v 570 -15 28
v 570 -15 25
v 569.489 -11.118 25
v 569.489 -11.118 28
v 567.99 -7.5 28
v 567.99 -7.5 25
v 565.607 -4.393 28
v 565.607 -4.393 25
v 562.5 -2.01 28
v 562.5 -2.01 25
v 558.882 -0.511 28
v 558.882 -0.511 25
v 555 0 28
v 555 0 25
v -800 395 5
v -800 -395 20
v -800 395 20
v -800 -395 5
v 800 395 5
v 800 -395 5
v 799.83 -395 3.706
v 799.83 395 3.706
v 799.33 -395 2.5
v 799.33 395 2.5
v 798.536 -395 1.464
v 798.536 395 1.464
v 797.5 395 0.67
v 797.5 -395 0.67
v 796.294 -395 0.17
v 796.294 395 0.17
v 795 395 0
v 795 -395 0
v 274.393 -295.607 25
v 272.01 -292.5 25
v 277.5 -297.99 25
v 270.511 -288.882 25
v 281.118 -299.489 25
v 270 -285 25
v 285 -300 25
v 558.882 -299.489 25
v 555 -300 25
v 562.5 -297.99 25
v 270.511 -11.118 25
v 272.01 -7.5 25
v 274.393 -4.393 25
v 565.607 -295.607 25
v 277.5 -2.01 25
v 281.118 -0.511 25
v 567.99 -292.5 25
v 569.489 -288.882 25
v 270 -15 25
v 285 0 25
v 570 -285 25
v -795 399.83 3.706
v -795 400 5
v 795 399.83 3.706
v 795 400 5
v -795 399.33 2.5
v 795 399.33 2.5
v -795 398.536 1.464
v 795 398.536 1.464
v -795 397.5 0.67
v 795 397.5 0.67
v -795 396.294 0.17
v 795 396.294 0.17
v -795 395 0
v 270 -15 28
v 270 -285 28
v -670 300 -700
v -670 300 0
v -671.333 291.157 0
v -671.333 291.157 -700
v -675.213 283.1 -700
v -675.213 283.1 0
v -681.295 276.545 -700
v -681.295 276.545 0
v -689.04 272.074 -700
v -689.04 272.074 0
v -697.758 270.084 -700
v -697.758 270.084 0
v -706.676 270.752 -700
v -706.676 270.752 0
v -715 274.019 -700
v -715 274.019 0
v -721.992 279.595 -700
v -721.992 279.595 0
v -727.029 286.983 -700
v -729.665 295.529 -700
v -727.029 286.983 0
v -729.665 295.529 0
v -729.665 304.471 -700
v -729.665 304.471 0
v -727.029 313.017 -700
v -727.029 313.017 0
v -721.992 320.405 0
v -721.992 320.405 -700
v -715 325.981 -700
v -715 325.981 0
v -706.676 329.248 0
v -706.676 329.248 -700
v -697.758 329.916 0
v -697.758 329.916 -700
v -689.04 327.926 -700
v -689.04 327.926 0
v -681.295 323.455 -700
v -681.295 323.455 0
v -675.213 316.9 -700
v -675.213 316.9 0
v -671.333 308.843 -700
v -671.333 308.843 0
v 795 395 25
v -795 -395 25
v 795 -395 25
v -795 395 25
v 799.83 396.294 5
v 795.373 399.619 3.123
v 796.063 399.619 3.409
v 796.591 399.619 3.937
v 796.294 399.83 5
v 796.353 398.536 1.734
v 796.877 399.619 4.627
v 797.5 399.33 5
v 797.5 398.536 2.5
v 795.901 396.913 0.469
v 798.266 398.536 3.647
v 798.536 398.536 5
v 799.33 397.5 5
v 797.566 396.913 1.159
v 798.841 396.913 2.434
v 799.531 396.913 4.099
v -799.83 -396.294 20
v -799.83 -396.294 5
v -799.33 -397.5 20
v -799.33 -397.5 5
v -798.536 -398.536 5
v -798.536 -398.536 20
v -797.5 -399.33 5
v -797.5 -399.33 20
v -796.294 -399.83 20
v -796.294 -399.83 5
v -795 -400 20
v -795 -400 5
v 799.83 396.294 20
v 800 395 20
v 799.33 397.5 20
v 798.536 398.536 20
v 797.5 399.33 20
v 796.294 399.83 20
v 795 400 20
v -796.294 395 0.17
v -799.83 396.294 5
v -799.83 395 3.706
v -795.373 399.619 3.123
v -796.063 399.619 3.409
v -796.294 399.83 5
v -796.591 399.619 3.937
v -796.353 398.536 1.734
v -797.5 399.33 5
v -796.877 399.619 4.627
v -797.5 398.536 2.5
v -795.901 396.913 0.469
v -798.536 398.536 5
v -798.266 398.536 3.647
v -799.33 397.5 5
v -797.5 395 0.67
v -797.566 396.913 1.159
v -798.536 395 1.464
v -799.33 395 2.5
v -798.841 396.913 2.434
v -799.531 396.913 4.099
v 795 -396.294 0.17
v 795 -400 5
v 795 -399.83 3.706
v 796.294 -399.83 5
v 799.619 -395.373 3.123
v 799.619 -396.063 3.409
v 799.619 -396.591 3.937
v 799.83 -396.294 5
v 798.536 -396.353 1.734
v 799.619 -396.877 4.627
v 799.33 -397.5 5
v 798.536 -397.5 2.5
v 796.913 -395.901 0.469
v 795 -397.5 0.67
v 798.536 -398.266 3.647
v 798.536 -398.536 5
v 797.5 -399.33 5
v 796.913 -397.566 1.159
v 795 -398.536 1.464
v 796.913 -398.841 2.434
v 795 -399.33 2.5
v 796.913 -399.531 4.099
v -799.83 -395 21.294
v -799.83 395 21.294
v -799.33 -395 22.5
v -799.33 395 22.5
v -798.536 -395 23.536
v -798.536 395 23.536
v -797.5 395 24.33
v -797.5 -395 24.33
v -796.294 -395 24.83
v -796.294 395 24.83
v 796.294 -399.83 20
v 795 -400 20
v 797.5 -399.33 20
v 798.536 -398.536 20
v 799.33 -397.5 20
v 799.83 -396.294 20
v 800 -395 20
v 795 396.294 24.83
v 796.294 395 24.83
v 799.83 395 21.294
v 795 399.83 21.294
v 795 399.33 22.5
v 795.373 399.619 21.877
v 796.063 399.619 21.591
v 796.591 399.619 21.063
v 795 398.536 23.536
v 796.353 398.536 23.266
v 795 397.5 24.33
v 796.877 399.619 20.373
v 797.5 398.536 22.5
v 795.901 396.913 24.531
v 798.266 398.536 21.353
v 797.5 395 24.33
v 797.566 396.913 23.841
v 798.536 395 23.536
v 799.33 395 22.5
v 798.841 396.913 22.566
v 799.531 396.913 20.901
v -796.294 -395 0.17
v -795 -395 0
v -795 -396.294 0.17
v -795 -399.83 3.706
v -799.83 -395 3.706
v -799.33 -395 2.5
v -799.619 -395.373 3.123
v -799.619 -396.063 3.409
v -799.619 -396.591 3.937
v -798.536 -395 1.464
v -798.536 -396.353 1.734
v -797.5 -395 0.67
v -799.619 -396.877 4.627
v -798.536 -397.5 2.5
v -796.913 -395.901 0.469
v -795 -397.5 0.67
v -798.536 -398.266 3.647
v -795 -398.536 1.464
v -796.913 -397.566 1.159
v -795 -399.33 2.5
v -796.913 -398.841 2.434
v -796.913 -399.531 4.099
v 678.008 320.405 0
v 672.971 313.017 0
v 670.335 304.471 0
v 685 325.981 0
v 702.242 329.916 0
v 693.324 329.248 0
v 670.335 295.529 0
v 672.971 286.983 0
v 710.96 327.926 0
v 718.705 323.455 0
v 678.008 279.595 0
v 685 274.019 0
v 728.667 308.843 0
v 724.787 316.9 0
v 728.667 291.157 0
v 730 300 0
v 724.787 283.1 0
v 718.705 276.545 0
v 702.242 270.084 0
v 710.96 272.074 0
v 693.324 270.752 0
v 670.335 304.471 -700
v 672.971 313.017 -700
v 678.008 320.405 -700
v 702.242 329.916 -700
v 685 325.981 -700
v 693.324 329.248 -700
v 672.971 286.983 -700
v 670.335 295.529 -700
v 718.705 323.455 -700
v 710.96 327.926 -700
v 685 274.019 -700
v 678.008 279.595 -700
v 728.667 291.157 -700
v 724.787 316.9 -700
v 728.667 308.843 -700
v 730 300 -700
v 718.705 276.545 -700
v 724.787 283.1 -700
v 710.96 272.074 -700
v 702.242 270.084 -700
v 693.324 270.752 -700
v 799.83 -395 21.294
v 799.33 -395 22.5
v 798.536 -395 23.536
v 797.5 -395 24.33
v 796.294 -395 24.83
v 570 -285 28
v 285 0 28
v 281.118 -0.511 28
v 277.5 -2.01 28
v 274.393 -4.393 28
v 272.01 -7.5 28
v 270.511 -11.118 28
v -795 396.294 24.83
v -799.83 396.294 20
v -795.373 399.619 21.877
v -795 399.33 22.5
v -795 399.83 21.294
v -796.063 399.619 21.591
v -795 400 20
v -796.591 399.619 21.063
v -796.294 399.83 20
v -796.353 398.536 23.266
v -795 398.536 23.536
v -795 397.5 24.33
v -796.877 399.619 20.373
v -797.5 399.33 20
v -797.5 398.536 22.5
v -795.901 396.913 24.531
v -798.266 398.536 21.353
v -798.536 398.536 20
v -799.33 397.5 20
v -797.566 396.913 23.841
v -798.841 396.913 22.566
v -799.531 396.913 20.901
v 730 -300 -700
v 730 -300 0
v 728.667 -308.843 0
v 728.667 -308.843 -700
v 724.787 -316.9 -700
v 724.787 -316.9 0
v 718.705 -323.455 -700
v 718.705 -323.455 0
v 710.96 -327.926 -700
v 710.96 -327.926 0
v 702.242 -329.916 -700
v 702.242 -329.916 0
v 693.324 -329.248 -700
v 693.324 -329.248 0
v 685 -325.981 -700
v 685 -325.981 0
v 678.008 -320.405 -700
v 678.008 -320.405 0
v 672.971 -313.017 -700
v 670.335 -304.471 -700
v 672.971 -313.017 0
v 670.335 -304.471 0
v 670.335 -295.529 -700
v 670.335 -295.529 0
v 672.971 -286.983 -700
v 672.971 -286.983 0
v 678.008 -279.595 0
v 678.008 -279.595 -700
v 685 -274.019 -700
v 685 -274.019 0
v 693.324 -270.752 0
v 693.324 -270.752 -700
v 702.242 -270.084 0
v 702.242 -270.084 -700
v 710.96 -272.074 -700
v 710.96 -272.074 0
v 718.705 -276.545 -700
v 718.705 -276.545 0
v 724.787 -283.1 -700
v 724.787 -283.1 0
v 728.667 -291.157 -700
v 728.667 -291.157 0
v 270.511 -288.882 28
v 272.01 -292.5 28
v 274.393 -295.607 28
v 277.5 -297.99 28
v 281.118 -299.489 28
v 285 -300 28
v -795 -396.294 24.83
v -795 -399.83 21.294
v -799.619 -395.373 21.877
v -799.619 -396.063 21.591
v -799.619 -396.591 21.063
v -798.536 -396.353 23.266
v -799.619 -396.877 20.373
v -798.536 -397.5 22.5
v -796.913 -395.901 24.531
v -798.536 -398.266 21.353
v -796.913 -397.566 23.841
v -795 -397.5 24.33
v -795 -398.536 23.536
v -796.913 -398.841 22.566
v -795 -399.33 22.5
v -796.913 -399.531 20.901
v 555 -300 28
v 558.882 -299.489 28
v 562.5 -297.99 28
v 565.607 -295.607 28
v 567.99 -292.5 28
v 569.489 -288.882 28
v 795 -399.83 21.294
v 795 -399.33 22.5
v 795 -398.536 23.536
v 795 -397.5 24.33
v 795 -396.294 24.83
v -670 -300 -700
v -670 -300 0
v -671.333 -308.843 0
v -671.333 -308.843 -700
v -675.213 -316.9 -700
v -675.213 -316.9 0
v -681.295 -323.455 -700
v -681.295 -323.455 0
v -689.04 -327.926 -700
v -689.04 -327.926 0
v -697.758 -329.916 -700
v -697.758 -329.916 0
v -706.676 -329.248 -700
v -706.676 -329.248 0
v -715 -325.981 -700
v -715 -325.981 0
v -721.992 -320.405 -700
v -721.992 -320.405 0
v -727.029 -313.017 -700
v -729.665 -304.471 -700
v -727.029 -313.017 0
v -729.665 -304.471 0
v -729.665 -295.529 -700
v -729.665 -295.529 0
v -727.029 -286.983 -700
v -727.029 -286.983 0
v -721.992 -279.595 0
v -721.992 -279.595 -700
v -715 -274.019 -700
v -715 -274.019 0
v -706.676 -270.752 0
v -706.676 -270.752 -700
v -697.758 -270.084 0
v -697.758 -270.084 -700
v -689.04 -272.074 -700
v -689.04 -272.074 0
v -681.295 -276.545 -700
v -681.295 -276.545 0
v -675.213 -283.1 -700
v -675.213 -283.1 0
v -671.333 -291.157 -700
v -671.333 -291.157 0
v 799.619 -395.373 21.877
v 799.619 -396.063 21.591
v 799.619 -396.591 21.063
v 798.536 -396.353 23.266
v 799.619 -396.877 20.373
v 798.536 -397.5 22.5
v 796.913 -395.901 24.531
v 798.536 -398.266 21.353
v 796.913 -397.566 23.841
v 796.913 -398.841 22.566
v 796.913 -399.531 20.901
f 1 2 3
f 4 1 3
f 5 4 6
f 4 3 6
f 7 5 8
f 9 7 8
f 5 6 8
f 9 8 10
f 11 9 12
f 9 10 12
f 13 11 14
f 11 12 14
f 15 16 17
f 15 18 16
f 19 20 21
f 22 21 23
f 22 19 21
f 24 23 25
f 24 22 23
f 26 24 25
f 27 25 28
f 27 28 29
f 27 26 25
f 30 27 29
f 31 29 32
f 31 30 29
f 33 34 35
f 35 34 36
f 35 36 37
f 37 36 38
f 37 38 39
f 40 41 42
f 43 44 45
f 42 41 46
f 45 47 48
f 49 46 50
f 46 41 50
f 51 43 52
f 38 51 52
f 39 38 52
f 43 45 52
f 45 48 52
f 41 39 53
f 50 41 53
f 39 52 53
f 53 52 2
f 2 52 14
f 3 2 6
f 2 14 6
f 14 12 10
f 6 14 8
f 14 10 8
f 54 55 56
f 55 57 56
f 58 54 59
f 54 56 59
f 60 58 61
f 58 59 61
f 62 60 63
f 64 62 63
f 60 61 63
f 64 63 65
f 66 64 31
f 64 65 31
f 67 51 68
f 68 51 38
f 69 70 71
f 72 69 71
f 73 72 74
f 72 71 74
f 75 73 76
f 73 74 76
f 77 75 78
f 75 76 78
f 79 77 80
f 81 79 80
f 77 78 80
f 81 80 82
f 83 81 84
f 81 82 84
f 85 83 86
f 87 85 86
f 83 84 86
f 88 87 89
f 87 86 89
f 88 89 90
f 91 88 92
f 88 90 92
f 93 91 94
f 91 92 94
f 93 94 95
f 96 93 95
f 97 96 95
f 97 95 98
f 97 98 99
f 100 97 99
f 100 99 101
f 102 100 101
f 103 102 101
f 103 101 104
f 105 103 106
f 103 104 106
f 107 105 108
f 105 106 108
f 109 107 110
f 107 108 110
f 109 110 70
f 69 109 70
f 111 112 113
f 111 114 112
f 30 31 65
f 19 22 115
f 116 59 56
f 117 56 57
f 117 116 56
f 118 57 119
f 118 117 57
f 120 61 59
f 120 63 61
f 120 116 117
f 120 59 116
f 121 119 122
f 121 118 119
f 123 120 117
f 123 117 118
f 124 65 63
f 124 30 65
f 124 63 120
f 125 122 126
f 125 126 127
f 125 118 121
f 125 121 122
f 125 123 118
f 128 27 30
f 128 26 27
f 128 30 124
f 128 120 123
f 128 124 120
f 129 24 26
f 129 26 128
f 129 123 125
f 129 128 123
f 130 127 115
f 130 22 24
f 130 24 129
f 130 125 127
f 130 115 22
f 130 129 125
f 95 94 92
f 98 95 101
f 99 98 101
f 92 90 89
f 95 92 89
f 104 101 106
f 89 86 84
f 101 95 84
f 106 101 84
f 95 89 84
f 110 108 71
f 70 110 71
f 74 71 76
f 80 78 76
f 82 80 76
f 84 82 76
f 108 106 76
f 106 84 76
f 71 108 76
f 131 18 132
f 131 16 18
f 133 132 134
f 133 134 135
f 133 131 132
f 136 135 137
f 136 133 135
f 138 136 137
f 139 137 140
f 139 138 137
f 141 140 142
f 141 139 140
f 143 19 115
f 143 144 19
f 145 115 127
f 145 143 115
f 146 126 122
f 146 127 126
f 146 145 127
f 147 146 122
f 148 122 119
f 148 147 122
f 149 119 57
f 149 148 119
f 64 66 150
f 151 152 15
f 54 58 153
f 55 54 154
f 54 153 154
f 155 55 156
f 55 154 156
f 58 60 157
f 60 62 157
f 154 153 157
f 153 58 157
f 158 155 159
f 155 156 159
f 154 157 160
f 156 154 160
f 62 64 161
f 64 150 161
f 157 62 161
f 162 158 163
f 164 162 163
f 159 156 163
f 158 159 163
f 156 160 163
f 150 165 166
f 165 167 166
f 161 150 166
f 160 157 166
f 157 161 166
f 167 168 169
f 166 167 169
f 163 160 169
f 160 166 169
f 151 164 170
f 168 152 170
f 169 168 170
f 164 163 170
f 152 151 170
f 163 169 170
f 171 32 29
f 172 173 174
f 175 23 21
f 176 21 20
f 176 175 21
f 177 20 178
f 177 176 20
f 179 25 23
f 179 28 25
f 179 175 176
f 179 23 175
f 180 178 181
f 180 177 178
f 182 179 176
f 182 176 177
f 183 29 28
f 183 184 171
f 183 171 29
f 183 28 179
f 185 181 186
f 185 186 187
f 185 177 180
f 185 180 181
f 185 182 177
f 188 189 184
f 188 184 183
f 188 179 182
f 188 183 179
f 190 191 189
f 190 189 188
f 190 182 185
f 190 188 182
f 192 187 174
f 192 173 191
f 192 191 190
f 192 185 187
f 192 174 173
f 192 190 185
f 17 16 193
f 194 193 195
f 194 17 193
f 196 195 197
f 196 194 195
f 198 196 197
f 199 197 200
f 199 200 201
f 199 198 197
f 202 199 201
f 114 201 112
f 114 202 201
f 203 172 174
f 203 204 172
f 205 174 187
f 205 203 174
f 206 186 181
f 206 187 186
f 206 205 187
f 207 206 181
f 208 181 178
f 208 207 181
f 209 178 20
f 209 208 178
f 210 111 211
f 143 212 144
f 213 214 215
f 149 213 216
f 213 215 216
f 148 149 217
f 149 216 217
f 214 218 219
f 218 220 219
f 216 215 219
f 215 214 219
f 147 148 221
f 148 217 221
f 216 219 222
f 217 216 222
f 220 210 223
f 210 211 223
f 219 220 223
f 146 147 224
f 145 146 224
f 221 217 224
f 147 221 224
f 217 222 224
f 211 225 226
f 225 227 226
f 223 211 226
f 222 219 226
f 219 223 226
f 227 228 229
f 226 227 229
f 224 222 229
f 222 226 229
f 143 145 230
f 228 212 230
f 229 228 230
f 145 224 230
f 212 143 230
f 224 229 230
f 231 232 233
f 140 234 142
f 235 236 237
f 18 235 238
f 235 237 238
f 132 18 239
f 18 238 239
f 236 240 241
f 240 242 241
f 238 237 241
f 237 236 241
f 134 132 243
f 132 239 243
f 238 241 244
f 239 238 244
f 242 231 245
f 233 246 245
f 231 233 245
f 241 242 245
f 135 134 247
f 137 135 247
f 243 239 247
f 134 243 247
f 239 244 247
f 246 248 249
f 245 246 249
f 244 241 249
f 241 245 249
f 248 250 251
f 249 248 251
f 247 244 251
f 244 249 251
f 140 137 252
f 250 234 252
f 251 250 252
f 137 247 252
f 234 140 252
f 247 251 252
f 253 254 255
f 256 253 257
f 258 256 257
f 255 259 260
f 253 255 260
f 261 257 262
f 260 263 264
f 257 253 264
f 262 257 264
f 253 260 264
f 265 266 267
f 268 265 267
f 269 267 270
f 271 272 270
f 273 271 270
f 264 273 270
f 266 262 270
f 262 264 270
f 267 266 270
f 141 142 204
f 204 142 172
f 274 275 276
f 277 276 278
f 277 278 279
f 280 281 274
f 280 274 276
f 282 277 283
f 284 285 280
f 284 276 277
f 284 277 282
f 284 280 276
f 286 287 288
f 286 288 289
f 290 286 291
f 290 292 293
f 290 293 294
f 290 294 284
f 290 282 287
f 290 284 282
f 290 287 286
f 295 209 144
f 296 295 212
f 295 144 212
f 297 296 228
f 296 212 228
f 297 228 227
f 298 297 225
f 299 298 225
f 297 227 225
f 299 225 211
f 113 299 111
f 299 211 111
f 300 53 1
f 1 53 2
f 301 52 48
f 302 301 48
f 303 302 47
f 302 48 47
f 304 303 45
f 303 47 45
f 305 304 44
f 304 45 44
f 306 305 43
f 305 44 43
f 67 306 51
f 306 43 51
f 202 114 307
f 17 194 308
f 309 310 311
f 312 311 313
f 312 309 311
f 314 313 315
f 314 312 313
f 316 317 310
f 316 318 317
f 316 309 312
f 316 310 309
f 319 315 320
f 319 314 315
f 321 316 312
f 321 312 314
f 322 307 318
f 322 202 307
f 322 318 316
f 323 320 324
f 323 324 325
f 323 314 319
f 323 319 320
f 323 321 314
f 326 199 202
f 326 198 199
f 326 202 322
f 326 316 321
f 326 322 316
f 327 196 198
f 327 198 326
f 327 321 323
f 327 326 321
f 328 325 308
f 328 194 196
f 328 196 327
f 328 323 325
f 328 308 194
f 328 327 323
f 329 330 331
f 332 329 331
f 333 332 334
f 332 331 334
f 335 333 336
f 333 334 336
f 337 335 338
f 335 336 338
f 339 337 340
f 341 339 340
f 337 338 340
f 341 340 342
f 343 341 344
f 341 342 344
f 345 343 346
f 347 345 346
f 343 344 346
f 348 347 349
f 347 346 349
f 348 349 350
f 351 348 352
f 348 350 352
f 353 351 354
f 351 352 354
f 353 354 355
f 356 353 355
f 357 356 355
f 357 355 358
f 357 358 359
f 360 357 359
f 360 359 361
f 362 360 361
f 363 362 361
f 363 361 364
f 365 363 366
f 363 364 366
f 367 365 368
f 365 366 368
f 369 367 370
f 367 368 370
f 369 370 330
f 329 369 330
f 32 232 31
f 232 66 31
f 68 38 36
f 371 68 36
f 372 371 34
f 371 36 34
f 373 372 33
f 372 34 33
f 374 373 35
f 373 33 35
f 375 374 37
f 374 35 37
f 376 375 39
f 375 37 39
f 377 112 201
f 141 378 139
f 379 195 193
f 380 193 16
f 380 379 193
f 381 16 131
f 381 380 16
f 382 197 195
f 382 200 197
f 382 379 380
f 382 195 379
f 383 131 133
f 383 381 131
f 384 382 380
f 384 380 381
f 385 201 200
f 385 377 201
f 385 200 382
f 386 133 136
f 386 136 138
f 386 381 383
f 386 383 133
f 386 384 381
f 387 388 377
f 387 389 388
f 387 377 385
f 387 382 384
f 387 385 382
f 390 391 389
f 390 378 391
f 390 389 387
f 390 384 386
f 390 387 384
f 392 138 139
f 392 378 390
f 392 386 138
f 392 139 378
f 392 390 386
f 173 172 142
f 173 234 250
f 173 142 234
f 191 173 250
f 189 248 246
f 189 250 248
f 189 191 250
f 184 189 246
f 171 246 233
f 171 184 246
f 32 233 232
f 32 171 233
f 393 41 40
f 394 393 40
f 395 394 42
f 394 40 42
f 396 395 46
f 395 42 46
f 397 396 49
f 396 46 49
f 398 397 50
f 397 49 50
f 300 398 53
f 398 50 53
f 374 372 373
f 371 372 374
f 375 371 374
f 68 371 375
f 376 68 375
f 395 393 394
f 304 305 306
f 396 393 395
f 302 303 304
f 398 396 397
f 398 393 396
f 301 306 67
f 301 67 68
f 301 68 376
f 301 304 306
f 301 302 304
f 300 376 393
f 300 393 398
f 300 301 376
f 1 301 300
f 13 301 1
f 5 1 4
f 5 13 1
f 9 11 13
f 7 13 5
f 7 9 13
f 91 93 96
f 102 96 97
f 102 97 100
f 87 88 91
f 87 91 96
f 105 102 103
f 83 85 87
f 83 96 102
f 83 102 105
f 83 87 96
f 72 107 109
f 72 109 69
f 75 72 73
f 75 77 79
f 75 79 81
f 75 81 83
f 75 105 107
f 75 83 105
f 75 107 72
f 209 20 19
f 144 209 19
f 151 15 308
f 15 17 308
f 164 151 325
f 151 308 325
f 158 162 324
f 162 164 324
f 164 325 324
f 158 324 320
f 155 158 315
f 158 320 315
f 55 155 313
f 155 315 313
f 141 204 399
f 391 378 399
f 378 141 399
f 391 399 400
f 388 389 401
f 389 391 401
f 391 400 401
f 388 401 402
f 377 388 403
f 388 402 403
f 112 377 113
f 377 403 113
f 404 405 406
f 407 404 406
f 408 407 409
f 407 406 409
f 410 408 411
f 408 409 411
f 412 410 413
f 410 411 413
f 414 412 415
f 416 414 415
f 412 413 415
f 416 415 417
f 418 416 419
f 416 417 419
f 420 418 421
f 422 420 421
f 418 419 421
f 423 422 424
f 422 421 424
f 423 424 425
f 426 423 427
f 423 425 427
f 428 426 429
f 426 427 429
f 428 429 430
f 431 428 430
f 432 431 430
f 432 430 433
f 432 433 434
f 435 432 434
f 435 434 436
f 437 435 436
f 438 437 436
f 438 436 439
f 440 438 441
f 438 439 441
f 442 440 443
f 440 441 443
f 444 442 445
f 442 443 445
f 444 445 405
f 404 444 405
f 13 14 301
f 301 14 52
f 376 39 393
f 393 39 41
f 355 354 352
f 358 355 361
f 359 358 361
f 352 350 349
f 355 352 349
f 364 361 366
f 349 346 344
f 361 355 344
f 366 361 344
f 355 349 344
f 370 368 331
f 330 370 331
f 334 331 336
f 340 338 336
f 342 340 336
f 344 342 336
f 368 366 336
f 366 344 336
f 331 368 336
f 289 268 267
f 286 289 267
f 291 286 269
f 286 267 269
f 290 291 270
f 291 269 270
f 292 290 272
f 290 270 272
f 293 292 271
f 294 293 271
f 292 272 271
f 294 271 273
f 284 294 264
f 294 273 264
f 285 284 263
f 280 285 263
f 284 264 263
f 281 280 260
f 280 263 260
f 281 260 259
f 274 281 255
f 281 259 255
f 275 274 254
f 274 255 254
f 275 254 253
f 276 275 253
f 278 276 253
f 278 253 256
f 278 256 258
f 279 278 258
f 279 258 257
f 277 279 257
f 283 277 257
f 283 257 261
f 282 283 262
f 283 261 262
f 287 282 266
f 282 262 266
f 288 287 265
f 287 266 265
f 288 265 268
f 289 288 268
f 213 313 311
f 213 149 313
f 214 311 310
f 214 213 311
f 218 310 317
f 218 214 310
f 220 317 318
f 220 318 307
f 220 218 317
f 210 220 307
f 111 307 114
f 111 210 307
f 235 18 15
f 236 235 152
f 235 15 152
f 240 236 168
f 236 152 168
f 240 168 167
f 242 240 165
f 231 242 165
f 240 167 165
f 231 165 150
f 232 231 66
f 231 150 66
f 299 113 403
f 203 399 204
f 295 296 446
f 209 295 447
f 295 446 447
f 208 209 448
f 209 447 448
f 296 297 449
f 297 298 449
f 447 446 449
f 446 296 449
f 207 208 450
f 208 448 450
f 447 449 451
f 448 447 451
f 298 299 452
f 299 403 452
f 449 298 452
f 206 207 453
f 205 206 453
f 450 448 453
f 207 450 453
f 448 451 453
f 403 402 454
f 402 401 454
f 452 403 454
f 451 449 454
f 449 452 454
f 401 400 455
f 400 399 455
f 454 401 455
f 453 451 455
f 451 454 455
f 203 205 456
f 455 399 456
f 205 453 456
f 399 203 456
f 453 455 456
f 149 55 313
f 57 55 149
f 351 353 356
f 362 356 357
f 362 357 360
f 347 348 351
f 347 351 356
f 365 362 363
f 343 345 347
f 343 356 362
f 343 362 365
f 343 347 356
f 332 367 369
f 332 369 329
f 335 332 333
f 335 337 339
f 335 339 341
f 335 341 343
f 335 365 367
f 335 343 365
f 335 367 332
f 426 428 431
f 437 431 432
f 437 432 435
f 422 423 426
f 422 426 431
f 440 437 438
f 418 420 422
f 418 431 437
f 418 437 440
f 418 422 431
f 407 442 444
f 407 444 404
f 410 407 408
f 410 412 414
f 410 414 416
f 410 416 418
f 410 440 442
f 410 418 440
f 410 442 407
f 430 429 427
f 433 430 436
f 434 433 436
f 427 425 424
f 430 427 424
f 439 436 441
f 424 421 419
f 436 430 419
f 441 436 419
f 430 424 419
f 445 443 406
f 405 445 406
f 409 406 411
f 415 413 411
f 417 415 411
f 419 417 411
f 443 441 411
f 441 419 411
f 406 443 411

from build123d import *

# Parameters (mm, degrees)
F0_W     = 1600
F0_H     = 800
F1_DEPTH = 25
F2_R     = 5
F3_R     = 30
F4_DEPTH = 700
F6_DEPTH = 3


with BuildPart() as f1:
    # F0 (on Top) → F1 (new body)
    with BuildSketch(Plane.XY):
        Rectangle(F0_W, F0_H)
    extrude(amount=F1_DEPTH)

    # F2
    f2_edges = [f1.edges().sort_by_distance(p)[0] for p in [
        (0, -400, 25),
        (0, -400, 0),
        (-800, 0, 25),
        (-800, 0, 0),
        (800, 0, 0),
        (800, 0, 25),
        (0, 400, 0),
        (0, 400, 25),
        (800, 400, 12.5),
        (800, -400, 12.5),
        (-800, -400, 12.5),
        (-800, 400, 12.5),
    ]]
    fillet(f2_edges, radius=F2_R)


with BuildPart() as f4:
    # F3 (on face) → F4 (new body)
    with BuildSketch(Plane(origin=(0, 0, 0), x_dir=(1, 0, 0), z_dir=(0, 0, -1))):
        with Locations((-700, 300)):
            Circle(F3_R)
        with Locations((700, 300)):
            Circle(F3_R)
        with Locations((700, -300)):
            Circle(F3_R)
        with Locations((-700, -300)):
            Circle(F3_R)
    extrude(amount=F4_DEPTH)


with BuildPart() as f6:
    # F5 (on face) → F6 (new body)
    with BuildSketch(Plane.XY.offset(25)):
        with BuildLine():
            Line((285, -300), (555, -300))
            ThreePointArc((555, -300), (565.606602, -295.606602), (570, -285))
            Line((570, -285), (570, -15))
            ThreePointArc((570, -15), (565.606602, -4.393398), (555, 0))
            Line((555, 0), (285, 0))
            ThreePointArc((285, 0), (274.393398, -4.393398), (270, -15))
            Line((270, -15), (270, -285))
            ThreePointArc((270, -285), (274.393398, -295.606602), (285, -300))
        make_face()
    extrude(amount=F6_DEPTH)


solid = Compound([f1.part, f4.part, f6.part])
